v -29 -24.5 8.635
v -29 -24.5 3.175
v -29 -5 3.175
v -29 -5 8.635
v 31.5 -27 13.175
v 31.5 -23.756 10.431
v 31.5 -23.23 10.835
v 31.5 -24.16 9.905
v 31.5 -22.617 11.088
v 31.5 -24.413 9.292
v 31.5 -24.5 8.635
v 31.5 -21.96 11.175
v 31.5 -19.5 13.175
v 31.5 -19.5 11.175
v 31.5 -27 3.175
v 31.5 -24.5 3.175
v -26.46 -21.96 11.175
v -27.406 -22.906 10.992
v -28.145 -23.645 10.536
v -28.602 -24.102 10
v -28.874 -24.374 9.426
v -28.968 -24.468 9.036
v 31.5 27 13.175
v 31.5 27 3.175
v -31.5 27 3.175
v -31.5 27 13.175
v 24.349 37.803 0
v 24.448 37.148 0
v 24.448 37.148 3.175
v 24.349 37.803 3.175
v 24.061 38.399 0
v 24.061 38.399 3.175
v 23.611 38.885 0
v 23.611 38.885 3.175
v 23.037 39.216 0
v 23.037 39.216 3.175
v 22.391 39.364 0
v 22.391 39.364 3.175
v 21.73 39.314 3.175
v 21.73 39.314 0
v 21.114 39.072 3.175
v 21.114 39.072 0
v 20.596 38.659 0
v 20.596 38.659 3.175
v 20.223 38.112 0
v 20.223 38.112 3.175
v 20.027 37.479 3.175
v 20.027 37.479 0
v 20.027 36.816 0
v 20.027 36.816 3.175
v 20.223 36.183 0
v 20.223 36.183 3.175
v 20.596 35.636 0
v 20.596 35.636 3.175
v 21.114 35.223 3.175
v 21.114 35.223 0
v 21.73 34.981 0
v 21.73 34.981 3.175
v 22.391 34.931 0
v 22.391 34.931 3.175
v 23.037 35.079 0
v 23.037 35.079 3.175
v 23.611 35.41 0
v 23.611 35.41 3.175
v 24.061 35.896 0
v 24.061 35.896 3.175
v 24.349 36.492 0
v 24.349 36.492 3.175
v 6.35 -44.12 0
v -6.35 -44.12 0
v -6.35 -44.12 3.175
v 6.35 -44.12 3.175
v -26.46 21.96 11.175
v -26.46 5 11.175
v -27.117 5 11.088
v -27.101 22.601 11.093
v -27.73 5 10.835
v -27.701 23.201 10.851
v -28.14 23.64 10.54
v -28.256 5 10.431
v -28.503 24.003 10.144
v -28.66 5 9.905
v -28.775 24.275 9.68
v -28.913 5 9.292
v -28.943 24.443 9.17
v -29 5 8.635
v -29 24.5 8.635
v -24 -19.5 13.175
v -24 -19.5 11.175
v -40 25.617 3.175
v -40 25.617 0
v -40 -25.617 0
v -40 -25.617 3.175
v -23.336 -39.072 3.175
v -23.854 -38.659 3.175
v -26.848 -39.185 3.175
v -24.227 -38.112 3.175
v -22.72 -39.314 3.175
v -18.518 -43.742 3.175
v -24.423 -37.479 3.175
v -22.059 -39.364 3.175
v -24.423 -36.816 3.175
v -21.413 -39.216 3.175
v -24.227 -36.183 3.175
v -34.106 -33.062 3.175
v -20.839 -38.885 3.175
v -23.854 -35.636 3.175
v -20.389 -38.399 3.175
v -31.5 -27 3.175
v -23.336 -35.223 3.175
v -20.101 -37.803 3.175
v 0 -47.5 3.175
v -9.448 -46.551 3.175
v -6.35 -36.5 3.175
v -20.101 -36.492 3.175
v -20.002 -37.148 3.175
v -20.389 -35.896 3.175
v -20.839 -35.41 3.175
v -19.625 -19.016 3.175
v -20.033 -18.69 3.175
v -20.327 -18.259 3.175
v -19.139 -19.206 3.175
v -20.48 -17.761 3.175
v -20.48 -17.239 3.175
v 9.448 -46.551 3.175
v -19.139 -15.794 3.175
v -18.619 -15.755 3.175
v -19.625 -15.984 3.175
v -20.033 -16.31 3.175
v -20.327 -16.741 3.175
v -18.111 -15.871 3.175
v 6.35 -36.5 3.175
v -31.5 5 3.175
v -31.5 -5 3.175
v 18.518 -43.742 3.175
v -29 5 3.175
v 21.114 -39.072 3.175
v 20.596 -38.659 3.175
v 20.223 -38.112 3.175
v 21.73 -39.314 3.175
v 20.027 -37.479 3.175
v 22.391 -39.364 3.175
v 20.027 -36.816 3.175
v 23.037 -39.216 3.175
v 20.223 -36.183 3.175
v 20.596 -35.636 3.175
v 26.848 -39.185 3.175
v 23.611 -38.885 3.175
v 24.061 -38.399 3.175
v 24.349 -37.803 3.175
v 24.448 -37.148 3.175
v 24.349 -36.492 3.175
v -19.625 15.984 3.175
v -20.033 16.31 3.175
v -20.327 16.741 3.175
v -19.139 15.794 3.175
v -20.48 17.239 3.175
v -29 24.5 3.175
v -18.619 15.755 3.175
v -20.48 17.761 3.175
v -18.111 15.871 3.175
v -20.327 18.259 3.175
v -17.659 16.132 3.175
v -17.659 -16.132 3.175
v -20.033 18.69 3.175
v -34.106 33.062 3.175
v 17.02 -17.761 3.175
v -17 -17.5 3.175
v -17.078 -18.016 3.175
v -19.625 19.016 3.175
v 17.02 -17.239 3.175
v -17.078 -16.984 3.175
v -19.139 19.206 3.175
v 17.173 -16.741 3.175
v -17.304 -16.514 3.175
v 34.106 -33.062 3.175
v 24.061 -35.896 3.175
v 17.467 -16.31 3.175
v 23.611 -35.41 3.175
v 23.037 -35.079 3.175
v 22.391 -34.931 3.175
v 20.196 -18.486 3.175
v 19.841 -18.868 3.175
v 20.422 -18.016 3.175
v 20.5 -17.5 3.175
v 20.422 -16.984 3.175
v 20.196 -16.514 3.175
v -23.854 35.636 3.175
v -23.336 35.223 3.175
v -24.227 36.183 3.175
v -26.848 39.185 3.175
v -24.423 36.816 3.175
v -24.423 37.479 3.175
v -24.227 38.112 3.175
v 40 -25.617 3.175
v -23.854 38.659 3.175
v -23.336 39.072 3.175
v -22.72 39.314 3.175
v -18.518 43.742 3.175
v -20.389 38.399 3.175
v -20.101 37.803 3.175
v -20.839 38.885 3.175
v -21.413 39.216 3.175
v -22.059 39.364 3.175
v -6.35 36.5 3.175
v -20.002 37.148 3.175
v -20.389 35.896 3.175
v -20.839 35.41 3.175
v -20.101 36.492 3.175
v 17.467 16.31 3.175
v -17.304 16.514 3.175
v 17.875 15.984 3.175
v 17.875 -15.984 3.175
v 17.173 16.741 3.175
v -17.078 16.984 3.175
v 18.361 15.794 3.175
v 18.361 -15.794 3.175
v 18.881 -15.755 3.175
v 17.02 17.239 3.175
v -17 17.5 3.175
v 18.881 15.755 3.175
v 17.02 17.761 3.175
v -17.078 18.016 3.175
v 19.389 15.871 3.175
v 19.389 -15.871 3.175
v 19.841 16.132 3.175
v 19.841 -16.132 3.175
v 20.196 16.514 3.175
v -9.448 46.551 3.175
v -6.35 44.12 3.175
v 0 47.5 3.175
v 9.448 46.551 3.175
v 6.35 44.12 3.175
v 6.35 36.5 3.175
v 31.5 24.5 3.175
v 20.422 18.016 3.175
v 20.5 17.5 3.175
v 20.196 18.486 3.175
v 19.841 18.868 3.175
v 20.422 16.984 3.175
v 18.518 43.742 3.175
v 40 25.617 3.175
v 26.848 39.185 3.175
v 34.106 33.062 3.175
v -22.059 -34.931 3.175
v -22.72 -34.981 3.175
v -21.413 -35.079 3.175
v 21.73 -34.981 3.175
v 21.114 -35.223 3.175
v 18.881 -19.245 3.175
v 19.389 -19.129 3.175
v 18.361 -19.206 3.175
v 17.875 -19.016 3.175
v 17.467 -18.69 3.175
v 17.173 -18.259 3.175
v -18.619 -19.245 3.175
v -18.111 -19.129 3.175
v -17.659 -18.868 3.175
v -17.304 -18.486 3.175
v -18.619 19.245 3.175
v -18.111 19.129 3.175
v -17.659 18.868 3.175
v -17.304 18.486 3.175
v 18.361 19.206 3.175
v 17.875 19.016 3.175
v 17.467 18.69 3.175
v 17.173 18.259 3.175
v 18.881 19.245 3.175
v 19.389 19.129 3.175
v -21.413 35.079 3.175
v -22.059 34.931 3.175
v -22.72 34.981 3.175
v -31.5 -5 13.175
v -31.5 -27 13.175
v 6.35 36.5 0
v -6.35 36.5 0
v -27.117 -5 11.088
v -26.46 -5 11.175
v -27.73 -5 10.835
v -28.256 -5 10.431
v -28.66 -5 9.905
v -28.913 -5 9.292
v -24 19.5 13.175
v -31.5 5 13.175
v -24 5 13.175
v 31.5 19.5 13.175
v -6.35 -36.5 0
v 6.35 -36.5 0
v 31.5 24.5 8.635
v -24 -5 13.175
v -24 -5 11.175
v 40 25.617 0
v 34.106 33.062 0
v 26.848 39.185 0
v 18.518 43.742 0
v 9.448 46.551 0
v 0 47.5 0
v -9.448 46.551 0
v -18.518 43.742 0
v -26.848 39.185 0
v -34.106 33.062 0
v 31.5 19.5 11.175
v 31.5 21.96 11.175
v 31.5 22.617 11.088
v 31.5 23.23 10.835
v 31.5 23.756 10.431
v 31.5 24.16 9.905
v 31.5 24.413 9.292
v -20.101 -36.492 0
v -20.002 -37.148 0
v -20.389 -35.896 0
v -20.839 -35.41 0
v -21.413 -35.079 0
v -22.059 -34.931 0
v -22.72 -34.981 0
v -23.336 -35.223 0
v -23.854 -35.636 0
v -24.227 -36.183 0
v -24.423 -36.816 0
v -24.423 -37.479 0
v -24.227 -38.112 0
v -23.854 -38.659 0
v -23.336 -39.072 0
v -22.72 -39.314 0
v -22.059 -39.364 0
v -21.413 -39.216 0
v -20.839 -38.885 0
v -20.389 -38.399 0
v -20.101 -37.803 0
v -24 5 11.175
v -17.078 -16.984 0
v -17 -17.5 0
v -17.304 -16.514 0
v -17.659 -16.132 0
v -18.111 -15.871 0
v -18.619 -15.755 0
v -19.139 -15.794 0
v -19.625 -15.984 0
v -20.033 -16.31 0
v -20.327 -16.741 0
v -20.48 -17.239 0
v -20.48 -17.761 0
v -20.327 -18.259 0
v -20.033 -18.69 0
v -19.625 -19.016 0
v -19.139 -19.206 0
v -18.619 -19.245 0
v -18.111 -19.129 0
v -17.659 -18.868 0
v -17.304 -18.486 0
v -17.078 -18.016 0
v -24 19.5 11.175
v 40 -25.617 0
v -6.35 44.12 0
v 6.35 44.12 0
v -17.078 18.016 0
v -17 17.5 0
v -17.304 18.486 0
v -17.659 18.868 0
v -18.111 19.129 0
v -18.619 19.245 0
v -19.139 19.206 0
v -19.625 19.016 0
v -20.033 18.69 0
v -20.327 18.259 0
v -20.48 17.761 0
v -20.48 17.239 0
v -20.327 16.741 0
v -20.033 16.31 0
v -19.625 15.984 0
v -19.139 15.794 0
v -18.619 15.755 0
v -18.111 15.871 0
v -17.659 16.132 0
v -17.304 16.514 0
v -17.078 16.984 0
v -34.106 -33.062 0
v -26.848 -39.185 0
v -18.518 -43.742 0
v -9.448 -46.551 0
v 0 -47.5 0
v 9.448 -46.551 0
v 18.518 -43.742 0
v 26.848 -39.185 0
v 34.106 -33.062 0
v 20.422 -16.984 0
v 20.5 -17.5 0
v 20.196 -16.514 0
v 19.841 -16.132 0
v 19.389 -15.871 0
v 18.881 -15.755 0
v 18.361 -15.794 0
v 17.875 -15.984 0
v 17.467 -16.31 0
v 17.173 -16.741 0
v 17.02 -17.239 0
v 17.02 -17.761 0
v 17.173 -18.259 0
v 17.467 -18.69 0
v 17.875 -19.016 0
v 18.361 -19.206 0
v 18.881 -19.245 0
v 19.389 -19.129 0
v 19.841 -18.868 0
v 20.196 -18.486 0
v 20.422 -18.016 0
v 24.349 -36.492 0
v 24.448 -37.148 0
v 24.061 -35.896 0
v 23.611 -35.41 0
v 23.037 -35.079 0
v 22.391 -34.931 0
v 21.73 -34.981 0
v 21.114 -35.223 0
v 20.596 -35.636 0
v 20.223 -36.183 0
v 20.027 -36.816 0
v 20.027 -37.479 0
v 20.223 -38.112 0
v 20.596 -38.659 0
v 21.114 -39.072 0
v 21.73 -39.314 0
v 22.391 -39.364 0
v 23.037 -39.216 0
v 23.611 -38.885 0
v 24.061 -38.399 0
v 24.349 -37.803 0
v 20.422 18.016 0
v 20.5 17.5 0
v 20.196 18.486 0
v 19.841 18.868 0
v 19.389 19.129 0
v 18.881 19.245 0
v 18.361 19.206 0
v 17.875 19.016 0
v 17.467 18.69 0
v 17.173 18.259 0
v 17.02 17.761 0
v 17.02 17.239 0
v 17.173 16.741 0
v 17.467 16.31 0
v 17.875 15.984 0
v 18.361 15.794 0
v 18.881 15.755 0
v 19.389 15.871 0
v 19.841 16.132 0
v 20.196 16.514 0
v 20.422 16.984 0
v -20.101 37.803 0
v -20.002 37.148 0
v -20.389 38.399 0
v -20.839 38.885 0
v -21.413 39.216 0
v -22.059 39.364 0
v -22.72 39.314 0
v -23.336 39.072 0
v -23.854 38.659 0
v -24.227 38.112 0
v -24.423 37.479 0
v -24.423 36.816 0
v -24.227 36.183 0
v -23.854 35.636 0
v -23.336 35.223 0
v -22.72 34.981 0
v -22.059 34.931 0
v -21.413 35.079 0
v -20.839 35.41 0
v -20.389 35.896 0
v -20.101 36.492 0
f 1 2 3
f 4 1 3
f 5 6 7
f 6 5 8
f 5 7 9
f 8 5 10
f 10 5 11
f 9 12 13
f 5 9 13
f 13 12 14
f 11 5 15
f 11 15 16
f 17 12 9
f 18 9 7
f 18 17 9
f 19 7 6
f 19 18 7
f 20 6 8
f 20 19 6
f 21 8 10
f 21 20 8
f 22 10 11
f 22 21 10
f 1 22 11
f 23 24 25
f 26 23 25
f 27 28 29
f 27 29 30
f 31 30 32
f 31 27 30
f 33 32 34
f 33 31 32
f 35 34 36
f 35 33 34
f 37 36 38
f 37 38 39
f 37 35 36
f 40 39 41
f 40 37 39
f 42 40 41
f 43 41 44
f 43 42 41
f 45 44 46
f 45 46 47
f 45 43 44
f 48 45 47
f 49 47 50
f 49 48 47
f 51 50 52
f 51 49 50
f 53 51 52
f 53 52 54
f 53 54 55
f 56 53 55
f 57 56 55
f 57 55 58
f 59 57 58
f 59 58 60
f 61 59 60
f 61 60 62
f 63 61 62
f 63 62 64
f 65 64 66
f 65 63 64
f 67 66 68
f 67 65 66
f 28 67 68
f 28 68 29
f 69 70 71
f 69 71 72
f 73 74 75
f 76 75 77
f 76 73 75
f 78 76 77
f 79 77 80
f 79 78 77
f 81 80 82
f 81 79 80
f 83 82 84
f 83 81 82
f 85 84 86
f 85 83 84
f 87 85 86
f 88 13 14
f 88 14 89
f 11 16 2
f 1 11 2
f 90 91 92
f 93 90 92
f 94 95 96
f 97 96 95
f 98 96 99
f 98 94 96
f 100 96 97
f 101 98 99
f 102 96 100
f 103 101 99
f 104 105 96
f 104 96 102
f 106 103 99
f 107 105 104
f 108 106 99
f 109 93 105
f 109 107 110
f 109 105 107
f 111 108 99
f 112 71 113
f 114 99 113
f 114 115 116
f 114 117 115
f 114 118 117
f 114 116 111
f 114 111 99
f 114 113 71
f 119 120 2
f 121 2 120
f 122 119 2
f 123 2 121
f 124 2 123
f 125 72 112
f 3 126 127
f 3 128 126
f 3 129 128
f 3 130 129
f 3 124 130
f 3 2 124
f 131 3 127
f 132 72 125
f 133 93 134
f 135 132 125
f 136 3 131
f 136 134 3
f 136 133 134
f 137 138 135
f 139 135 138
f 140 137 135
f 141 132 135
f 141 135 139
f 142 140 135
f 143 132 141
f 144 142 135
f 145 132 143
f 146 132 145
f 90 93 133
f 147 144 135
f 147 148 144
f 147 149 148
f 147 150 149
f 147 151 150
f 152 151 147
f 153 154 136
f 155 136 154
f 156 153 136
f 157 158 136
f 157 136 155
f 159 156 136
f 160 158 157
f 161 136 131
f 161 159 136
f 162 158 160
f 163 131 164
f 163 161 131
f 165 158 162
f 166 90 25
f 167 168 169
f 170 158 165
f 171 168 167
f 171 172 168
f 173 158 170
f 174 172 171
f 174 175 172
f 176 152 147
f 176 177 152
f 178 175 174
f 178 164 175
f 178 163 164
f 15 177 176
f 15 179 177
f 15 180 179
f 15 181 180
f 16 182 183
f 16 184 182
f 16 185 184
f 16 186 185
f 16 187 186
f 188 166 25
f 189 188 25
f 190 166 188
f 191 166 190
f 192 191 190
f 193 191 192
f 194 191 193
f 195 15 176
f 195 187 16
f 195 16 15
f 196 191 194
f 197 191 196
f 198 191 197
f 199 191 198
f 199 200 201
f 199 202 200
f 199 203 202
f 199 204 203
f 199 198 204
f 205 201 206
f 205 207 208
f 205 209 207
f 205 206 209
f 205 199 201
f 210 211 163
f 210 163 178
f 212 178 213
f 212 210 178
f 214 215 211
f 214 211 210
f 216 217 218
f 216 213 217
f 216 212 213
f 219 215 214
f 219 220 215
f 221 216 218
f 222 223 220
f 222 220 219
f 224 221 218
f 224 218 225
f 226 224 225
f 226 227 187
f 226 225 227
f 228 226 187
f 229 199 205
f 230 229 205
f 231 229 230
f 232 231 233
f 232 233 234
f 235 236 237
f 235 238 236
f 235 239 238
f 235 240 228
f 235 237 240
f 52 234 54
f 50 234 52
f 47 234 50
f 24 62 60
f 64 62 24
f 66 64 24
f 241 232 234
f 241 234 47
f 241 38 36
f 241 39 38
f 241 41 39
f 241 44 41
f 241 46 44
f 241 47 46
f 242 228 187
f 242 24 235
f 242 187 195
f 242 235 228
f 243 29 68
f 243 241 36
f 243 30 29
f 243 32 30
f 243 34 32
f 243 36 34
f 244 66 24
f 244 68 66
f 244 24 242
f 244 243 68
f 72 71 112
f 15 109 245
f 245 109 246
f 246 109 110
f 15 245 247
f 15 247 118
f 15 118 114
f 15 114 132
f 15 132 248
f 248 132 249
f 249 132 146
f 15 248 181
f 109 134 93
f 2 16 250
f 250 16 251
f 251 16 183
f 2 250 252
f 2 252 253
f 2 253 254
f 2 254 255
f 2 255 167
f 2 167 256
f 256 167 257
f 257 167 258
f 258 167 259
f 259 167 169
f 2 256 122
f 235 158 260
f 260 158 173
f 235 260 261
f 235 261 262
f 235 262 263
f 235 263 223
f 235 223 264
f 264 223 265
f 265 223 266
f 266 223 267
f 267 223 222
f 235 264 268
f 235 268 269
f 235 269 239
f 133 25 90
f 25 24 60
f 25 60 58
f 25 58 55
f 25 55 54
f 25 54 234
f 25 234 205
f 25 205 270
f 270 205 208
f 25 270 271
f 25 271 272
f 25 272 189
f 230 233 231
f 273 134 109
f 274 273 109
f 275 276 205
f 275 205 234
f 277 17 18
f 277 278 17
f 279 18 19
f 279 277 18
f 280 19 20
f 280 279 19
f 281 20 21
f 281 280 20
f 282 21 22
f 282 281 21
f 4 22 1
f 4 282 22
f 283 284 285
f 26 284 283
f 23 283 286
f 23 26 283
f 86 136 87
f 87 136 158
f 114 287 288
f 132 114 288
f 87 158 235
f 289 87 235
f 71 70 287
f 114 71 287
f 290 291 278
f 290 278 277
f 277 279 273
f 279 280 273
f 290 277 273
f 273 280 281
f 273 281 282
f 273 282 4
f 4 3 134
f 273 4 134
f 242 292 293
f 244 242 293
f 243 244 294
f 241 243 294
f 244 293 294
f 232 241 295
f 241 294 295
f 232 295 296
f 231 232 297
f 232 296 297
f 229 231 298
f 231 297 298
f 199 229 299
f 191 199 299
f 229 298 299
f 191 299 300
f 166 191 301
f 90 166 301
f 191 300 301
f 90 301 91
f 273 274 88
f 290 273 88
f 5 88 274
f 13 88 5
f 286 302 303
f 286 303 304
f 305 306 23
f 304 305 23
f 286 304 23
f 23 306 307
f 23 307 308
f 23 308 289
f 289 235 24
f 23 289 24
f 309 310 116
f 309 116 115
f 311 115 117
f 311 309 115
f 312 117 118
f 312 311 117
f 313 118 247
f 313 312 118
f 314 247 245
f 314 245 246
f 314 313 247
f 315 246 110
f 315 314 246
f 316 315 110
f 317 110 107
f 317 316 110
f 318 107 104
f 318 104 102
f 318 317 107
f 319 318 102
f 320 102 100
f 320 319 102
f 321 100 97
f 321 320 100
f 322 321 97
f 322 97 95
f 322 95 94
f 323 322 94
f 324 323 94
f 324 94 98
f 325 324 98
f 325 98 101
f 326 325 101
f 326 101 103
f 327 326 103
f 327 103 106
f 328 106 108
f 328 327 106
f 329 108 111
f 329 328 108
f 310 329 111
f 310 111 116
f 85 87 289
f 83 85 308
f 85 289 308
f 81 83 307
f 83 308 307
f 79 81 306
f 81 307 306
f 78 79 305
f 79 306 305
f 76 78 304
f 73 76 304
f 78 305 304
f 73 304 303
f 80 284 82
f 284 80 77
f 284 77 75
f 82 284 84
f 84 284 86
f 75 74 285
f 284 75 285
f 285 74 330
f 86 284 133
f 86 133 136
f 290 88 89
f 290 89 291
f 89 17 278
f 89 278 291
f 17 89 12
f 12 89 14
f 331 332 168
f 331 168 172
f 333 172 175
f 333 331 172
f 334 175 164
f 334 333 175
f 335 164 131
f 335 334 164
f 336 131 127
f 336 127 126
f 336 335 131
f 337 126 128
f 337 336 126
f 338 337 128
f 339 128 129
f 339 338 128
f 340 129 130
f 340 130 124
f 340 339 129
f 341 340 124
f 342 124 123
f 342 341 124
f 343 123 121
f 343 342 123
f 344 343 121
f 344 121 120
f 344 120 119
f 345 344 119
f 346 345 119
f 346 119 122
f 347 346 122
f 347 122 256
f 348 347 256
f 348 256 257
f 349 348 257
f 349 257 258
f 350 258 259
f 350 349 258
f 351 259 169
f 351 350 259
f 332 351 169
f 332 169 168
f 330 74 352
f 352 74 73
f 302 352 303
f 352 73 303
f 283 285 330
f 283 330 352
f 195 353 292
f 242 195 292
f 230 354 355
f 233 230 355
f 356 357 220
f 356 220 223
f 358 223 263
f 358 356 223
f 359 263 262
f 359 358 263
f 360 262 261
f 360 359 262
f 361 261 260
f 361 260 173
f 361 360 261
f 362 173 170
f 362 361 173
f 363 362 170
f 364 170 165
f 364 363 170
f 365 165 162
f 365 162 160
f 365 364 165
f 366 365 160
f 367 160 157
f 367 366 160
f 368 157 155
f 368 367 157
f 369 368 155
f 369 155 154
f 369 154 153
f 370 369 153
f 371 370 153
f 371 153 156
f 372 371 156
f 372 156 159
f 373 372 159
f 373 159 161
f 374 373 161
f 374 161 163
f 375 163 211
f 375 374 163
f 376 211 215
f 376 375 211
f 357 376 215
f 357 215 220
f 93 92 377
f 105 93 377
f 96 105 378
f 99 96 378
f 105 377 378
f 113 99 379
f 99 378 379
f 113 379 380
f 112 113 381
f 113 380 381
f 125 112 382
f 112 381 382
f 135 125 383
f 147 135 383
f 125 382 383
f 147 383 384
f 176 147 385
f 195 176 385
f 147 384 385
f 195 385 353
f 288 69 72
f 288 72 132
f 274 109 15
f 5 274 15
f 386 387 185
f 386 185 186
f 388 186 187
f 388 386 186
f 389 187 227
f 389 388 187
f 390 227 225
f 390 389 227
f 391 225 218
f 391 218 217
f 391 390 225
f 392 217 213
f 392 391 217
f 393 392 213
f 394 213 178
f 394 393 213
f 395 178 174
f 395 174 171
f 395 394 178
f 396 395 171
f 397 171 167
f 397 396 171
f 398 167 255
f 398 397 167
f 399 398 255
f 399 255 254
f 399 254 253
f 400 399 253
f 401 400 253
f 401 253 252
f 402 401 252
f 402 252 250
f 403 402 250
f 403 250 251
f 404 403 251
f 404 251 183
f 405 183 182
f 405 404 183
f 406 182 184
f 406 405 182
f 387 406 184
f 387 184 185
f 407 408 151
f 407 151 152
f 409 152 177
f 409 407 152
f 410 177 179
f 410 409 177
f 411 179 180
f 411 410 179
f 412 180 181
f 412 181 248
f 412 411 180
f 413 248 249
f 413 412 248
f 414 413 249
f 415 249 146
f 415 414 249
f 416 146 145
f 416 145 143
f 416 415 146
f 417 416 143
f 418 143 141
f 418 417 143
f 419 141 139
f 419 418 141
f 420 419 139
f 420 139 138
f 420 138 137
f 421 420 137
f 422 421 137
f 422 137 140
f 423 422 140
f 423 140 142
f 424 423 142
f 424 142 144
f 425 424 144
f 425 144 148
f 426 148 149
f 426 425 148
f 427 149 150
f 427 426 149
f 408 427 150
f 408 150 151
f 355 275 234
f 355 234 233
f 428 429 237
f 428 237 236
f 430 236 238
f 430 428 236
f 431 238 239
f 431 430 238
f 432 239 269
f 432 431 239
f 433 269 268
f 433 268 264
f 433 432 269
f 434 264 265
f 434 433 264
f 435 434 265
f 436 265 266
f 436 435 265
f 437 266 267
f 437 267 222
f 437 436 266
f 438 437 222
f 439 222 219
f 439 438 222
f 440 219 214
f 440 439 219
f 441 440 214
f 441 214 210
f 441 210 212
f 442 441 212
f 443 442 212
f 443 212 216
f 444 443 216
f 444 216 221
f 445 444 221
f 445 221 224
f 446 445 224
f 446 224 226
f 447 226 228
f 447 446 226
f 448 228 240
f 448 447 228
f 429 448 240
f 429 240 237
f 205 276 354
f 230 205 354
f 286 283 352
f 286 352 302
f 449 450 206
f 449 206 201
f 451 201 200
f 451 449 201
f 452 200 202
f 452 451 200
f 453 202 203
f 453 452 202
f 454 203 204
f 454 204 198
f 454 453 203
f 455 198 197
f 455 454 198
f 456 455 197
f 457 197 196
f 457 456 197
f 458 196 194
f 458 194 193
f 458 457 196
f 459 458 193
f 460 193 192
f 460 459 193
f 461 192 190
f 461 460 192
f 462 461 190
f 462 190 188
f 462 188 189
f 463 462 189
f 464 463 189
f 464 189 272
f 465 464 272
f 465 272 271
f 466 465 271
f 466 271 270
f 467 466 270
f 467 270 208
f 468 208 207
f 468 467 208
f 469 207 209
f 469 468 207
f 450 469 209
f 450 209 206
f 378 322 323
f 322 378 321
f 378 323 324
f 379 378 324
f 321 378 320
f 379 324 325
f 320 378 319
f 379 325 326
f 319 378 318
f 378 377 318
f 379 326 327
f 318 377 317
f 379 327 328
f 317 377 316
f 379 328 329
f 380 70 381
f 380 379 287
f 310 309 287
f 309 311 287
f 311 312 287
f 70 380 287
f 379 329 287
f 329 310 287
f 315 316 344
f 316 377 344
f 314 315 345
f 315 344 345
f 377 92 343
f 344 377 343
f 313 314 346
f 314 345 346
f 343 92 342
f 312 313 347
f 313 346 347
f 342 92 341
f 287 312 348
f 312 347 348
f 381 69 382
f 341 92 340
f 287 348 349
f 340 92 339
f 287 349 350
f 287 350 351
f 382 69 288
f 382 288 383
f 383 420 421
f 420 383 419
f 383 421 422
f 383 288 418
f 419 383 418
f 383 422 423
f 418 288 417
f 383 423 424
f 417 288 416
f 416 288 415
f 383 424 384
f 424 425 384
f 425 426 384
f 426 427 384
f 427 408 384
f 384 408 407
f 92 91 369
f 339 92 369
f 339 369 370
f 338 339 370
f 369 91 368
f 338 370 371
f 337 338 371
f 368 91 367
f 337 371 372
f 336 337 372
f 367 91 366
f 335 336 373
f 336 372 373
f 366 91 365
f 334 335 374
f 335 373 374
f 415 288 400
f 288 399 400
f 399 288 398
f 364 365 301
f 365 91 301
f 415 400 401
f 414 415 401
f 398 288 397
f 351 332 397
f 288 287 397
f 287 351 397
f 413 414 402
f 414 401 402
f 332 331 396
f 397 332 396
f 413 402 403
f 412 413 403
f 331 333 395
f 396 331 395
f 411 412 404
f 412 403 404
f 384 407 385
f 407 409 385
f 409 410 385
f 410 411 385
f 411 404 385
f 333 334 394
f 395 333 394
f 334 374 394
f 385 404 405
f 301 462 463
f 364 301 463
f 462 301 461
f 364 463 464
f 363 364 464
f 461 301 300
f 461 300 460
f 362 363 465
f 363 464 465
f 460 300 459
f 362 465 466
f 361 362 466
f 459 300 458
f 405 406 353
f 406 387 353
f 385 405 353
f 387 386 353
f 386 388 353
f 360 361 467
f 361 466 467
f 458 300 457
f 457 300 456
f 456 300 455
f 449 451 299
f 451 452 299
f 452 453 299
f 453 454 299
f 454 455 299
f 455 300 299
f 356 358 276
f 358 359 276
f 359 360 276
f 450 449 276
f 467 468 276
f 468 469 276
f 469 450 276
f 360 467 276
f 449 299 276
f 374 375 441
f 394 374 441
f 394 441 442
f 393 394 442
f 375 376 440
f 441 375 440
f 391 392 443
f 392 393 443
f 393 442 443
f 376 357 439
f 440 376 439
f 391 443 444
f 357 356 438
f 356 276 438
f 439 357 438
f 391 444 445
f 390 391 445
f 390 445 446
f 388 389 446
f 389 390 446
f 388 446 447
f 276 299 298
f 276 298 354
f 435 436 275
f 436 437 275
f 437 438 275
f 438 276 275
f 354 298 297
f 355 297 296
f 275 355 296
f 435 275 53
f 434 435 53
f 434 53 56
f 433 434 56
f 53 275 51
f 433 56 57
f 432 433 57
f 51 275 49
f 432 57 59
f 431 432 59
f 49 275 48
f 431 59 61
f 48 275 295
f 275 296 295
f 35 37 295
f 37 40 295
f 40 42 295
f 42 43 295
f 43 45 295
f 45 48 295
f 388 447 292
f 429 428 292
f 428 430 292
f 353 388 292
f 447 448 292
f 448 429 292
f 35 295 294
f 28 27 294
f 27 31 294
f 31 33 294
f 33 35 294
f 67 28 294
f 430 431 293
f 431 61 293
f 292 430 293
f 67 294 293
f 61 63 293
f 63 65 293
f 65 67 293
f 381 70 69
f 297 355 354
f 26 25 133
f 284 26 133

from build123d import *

# Parameters (mm, degrees)
F0_R     = 2.2225
F0_R_2   = 1.75
F0_W     = 12.7
F0_H     = 7.62
F1_DEPTH = 3.175
F3_DEPTH = 10
F5_DEPTH = 2
F6_R     = 2.54


with BuildPart() as f1:
    # F0 (on Top) → F1 (new body)
    with BuildSketch(Plane.XY):
        with BuildLine():
            Line((40, -25.617377), (40, 25.617377))
            ThreePointArc((40, 25.617377), (0, 47.5), (-40, 25.617377))
            Line((-40, 25.617377), (-40, -25.617377))
            ThreePointArc((-40, -25.617377), (0, -47.5), (40, -25.617377))
        make_face()
        with Locations((-22.225, -37.1475)):
            Circle(F0_R, mode=Mode.SUBTRACT)
        with Locations((-18.75, -17.5)):
            Circle(F0_R_2, mode=Mode.SUBTRACT)
        with Locations((0, -40.31)):
            Rectangle(F0_W, F0_H, mode=Mode.SUBTRACT)
        with Locations((22.225, -37.1475)):
            Circle(F0_R, mode=Mode.SUBTRACT)
        with Locations((18.75, -17.5)):
            Circle(F0_R_2, mode=Mode.SUBTRACT)
        with Locations((-18.75, 17.5)):
            Circle(F0_R_2, mode=Mode.SUBTRACT)
        with Locations((-22.225, 37.1475)):
            Circle(F0_R, mode=Mode.SUBTRACT)
        with Locations((18.75, 17.5)):
            Circle(F0_R_2, mode=Mode.SUBTRACT)
        with Locations((0, 40.31)):
            Rectangle(F0_W, F0_H, mode=Mode.SUBTRACT)
        with Locations((22.225, 37.1475)):
            Circle(F0_R, mode=Mode.SUBTRACT)
    extrude(amount=F1_DEPTH)

    # F2 (on face) → F3 (join)
    with BuildSketch(Plane.XY.offset(3.175)):
        Polygon((-31.5, -24.5), (-31.5, -27), (31.5, -27), (31.5, -24.5), (-29, -24.5), (-29, -5), (-31.5, -5), align=None)
        Polygon((31.5, 24.5), (31.5, 27), (-31.5, 27), (-31.5, 24.5), (-31.5, 5), (-29, 5), (-29, 24.5), align=None)
    extrude(amount=F3_DEPTH)

    # F4 (on face) → F5 (join)
    with BuildSketch(Plane.XY.offset(13.175)):
        Polygon((-31.5, -27), (31.5, -27), (31.5, -19.5), (-24, -19.5), (-24, -5), (-31.5, -5), (-31.5, -19.5), align=None)
        Polygon((-31.5, 14.288086), (-31.5, 5), (-24, 5), (-24, 19.5), (31.5, 19.5), (31.5, 27), (-31.5, 27), (-31.5, 20.743756), (-31.5, 19.5), align=None)
    extrude(amount=-F5_DEPTH)

    # F6
    f6_edges = [f1.edges().sort_by_distance(p)[0] for p in [
        (1.25, -24.5, 11.175),
        (1.25, 24.5, 11.175),
        (-29, -14.75, 11.175),
        (-29, 14.75, 11.175),
    ]]
    fillet(f6_edges, radius=F6_R)


solid = f1.part
